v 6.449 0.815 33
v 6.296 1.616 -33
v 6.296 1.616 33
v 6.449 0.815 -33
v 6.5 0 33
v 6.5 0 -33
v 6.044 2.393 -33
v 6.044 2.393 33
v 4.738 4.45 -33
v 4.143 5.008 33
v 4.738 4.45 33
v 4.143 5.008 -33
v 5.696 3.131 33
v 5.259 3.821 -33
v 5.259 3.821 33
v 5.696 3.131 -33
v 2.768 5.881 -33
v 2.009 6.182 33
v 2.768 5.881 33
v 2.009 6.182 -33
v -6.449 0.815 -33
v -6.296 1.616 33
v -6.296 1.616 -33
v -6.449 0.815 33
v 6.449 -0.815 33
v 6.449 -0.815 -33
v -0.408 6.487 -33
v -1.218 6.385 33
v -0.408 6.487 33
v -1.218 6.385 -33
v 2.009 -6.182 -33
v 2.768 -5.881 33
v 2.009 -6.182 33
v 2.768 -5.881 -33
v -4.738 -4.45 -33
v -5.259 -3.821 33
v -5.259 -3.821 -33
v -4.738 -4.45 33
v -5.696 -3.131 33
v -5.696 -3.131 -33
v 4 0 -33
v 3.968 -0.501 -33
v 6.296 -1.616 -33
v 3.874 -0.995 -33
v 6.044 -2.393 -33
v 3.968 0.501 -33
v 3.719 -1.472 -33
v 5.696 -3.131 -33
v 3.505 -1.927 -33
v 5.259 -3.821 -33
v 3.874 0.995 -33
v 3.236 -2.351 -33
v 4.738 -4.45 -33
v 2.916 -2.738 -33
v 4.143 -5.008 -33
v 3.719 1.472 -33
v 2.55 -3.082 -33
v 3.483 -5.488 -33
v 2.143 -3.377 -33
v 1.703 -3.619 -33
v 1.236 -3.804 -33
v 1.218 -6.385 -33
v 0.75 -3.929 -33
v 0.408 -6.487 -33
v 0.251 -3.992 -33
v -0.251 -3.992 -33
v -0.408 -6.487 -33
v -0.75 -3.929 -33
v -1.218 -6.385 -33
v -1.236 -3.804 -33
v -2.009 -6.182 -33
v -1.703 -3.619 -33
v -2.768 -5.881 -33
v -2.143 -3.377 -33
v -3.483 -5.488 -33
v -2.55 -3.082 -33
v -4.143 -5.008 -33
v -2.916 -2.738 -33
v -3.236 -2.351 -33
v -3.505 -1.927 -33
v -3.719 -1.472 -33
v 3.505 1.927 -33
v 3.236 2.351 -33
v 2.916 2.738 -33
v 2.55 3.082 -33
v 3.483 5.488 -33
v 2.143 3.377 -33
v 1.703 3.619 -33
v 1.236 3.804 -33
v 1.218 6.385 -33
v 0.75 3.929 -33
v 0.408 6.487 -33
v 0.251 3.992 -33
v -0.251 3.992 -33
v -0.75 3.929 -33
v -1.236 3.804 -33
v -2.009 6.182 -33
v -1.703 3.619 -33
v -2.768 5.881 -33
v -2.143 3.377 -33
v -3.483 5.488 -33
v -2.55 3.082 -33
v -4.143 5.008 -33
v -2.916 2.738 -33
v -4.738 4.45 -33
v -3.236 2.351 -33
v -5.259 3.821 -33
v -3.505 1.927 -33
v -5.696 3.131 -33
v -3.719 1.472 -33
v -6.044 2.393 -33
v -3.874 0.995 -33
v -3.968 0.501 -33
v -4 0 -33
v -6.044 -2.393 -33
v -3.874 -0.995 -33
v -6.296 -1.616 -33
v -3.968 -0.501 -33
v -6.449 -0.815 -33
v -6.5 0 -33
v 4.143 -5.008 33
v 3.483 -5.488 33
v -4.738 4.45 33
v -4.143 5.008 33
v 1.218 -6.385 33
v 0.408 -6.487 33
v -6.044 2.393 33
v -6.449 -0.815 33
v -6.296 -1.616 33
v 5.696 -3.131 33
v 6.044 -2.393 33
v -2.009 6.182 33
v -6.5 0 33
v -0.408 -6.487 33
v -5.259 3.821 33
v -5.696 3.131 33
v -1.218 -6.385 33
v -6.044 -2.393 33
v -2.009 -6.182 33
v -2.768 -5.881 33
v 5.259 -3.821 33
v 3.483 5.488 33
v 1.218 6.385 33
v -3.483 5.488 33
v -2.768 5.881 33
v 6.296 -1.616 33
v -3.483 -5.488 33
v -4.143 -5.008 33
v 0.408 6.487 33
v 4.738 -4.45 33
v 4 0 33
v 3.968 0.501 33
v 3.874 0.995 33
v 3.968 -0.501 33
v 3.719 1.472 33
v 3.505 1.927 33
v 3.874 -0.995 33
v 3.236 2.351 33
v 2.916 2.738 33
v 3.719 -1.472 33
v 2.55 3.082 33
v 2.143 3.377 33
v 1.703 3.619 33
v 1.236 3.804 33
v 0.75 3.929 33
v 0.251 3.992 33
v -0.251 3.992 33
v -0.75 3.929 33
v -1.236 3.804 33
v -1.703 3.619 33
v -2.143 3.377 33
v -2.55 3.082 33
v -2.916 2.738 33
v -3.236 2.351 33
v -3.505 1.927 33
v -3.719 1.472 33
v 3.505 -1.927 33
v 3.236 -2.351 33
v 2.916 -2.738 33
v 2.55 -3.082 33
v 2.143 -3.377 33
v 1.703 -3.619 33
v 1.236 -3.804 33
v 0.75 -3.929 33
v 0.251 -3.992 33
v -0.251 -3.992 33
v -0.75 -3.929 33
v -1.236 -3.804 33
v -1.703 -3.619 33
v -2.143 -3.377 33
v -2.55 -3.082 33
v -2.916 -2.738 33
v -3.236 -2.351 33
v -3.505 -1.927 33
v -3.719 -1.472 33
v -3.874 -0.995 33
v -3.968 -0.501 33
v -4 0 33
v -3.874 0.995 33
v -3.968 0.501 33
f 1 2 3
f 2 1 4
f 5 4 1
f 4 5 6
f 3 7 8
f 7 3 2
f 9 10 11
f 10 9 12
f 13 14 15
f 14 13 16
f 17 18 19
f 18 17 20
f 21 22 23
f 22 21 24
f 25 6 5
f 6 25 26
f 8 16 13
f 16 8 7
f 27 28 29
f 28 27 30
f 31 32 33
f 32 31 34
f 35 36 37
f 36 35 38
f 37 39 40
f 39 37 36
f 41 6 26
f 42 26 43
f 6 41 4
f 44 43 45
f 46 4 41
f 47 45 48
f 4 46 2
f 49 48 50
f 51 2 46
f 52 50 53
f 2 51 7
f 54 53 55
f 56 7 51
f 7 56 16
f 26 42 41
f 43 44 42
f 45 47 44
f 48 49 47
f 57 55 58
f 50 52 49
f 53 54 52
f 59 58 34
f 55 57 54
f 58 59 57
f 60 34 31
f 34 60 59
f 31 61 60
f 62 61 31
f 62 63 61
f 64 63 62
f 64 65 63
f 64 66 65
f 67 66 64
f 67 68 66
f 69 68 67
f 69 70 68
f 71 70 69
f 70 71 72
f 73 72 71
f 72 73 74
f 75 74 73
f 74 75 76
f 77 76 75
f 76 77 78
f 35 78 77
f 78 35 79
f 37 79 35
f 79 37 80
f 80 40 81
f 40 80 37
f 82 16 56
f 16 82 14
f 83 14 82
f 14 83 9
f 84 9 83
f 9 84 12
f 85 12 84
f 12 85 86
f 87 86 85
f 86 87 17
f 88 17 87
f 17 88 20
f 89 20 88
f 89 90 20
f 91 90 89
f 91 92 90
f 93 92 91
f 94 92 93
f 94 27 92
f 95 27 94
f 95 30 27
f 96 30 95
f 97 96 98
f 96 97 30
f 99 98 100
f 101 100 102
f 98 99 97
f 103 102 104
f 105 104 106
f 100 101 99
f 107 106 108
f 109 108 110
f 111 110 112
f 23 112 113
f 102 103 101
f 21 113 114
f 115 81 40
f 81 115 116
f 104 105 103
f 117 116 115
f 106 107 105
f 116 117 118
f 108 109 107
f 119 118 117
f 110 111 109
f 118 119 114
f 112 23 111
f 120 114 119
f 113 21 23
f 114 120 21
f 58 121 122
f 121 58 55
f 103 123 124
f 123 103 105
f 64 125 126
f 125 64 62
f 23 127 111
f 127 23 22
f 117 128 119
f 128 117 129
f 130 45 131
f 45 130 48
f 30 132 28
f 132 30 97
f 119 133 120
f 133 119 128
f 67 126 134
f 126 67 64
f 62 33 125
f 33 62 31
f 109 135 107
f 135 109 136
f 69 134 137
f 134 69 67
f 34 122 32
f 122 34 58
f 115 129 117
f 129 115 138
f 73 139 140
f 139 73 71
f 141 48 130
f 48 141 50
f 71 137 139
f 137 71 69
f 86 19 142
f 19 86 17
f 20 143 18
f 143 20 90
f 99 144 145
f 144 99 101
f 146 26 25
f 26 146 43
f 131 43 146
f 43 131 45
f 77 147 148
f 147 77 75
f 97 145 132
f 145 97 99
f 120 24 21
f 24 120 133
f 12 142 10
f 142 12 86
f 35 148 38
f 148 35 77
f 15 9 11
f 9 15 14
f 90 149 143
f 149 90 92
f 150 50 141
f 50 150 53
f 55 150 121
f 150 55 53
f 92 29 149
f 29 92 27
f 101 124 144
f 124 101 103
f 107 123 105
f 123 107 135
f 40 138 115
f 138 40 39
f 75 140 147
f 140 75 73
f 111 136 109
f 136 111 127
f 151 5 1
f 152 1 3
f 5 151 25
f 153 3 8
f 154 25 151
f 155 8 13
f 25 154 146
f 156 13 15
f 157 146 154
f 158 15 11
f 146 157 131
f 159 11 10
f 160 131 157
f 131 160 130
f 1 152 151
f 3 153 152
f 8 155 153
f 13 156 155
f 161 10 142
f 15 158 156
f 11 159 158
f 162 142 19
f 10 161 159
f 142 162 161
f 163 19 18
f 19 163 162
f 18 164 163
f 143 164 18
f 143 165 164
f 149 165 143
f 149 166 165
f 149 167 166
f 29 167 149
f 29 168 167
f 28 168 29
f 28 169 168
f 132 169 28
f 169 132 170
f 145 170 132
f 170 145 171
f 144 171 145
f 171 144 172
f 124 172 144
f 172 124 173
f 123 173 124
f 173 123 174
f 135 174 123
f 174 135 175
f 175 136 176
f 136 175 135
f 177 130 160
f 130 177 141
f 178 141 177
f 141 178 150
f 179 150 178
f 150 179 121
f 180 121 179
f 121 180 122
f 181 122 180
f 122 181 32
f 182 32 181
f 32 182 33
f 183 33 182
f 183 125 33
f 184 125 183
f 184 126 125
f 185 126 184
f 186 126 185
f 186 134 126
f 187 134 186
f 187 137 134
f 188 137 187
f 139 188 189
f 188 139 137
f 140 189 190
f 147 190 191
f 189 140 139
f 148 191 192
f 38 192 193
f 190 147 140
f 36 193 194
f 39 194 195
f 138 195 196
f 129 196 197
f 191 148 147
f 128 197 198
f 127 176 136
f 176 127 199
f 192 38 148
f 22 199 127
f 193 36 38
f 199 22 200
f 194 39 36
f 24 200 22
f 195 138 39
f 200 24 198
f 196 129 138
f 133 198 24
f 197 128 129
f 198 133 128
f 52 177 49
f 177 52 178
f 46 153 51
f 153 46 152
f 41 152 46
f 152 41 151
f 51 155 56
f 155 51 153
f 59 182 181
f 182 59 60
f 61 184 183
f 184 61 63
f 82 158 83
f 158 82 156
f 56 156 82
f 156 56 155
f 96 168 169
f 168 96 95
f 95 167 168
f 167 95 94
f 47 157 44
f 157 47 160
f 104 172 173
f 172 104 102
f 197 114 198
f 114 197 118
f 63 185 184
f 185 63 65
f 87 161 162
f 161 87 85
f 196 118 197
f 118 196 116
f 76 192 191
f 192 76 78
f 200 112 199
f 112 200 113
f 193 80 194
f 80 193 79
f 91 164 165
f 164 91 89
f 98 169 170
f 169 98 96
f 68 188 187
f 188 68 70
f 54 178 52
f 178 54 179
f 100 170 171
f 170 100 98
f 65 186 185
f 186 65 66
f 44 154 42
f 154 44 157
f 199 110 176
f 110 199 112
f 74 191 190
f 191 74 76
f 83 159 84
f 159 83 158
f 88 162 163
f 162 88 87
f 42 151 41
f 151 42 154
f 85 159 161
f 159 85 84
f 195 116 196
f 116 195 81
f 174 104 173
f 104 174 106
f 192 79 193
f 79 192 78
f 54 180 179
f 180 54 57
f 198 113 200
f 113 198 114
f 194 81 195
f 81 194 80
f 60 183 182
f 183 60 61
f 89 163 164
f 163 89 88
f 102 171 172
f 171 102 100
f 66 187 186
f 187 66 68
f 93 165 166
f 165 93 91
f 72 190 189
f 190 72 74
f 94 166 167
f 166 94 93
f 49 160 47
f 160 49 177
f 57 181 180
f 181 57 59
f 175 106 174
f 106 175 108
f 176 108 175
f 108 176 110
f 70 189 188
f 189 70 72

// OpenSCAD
$fn = 50;


difference() {
	union() {
		translate(v = [0, 0, -33.0000000000]) {
			cylinder(h = 66, r = 6.5000000000);
		}
	}
	union() {
		translate(v = [0, 0, -100.0000000000]) {
			cylinder(h = 200, r = 4.0000000000);
		}
	}
}
